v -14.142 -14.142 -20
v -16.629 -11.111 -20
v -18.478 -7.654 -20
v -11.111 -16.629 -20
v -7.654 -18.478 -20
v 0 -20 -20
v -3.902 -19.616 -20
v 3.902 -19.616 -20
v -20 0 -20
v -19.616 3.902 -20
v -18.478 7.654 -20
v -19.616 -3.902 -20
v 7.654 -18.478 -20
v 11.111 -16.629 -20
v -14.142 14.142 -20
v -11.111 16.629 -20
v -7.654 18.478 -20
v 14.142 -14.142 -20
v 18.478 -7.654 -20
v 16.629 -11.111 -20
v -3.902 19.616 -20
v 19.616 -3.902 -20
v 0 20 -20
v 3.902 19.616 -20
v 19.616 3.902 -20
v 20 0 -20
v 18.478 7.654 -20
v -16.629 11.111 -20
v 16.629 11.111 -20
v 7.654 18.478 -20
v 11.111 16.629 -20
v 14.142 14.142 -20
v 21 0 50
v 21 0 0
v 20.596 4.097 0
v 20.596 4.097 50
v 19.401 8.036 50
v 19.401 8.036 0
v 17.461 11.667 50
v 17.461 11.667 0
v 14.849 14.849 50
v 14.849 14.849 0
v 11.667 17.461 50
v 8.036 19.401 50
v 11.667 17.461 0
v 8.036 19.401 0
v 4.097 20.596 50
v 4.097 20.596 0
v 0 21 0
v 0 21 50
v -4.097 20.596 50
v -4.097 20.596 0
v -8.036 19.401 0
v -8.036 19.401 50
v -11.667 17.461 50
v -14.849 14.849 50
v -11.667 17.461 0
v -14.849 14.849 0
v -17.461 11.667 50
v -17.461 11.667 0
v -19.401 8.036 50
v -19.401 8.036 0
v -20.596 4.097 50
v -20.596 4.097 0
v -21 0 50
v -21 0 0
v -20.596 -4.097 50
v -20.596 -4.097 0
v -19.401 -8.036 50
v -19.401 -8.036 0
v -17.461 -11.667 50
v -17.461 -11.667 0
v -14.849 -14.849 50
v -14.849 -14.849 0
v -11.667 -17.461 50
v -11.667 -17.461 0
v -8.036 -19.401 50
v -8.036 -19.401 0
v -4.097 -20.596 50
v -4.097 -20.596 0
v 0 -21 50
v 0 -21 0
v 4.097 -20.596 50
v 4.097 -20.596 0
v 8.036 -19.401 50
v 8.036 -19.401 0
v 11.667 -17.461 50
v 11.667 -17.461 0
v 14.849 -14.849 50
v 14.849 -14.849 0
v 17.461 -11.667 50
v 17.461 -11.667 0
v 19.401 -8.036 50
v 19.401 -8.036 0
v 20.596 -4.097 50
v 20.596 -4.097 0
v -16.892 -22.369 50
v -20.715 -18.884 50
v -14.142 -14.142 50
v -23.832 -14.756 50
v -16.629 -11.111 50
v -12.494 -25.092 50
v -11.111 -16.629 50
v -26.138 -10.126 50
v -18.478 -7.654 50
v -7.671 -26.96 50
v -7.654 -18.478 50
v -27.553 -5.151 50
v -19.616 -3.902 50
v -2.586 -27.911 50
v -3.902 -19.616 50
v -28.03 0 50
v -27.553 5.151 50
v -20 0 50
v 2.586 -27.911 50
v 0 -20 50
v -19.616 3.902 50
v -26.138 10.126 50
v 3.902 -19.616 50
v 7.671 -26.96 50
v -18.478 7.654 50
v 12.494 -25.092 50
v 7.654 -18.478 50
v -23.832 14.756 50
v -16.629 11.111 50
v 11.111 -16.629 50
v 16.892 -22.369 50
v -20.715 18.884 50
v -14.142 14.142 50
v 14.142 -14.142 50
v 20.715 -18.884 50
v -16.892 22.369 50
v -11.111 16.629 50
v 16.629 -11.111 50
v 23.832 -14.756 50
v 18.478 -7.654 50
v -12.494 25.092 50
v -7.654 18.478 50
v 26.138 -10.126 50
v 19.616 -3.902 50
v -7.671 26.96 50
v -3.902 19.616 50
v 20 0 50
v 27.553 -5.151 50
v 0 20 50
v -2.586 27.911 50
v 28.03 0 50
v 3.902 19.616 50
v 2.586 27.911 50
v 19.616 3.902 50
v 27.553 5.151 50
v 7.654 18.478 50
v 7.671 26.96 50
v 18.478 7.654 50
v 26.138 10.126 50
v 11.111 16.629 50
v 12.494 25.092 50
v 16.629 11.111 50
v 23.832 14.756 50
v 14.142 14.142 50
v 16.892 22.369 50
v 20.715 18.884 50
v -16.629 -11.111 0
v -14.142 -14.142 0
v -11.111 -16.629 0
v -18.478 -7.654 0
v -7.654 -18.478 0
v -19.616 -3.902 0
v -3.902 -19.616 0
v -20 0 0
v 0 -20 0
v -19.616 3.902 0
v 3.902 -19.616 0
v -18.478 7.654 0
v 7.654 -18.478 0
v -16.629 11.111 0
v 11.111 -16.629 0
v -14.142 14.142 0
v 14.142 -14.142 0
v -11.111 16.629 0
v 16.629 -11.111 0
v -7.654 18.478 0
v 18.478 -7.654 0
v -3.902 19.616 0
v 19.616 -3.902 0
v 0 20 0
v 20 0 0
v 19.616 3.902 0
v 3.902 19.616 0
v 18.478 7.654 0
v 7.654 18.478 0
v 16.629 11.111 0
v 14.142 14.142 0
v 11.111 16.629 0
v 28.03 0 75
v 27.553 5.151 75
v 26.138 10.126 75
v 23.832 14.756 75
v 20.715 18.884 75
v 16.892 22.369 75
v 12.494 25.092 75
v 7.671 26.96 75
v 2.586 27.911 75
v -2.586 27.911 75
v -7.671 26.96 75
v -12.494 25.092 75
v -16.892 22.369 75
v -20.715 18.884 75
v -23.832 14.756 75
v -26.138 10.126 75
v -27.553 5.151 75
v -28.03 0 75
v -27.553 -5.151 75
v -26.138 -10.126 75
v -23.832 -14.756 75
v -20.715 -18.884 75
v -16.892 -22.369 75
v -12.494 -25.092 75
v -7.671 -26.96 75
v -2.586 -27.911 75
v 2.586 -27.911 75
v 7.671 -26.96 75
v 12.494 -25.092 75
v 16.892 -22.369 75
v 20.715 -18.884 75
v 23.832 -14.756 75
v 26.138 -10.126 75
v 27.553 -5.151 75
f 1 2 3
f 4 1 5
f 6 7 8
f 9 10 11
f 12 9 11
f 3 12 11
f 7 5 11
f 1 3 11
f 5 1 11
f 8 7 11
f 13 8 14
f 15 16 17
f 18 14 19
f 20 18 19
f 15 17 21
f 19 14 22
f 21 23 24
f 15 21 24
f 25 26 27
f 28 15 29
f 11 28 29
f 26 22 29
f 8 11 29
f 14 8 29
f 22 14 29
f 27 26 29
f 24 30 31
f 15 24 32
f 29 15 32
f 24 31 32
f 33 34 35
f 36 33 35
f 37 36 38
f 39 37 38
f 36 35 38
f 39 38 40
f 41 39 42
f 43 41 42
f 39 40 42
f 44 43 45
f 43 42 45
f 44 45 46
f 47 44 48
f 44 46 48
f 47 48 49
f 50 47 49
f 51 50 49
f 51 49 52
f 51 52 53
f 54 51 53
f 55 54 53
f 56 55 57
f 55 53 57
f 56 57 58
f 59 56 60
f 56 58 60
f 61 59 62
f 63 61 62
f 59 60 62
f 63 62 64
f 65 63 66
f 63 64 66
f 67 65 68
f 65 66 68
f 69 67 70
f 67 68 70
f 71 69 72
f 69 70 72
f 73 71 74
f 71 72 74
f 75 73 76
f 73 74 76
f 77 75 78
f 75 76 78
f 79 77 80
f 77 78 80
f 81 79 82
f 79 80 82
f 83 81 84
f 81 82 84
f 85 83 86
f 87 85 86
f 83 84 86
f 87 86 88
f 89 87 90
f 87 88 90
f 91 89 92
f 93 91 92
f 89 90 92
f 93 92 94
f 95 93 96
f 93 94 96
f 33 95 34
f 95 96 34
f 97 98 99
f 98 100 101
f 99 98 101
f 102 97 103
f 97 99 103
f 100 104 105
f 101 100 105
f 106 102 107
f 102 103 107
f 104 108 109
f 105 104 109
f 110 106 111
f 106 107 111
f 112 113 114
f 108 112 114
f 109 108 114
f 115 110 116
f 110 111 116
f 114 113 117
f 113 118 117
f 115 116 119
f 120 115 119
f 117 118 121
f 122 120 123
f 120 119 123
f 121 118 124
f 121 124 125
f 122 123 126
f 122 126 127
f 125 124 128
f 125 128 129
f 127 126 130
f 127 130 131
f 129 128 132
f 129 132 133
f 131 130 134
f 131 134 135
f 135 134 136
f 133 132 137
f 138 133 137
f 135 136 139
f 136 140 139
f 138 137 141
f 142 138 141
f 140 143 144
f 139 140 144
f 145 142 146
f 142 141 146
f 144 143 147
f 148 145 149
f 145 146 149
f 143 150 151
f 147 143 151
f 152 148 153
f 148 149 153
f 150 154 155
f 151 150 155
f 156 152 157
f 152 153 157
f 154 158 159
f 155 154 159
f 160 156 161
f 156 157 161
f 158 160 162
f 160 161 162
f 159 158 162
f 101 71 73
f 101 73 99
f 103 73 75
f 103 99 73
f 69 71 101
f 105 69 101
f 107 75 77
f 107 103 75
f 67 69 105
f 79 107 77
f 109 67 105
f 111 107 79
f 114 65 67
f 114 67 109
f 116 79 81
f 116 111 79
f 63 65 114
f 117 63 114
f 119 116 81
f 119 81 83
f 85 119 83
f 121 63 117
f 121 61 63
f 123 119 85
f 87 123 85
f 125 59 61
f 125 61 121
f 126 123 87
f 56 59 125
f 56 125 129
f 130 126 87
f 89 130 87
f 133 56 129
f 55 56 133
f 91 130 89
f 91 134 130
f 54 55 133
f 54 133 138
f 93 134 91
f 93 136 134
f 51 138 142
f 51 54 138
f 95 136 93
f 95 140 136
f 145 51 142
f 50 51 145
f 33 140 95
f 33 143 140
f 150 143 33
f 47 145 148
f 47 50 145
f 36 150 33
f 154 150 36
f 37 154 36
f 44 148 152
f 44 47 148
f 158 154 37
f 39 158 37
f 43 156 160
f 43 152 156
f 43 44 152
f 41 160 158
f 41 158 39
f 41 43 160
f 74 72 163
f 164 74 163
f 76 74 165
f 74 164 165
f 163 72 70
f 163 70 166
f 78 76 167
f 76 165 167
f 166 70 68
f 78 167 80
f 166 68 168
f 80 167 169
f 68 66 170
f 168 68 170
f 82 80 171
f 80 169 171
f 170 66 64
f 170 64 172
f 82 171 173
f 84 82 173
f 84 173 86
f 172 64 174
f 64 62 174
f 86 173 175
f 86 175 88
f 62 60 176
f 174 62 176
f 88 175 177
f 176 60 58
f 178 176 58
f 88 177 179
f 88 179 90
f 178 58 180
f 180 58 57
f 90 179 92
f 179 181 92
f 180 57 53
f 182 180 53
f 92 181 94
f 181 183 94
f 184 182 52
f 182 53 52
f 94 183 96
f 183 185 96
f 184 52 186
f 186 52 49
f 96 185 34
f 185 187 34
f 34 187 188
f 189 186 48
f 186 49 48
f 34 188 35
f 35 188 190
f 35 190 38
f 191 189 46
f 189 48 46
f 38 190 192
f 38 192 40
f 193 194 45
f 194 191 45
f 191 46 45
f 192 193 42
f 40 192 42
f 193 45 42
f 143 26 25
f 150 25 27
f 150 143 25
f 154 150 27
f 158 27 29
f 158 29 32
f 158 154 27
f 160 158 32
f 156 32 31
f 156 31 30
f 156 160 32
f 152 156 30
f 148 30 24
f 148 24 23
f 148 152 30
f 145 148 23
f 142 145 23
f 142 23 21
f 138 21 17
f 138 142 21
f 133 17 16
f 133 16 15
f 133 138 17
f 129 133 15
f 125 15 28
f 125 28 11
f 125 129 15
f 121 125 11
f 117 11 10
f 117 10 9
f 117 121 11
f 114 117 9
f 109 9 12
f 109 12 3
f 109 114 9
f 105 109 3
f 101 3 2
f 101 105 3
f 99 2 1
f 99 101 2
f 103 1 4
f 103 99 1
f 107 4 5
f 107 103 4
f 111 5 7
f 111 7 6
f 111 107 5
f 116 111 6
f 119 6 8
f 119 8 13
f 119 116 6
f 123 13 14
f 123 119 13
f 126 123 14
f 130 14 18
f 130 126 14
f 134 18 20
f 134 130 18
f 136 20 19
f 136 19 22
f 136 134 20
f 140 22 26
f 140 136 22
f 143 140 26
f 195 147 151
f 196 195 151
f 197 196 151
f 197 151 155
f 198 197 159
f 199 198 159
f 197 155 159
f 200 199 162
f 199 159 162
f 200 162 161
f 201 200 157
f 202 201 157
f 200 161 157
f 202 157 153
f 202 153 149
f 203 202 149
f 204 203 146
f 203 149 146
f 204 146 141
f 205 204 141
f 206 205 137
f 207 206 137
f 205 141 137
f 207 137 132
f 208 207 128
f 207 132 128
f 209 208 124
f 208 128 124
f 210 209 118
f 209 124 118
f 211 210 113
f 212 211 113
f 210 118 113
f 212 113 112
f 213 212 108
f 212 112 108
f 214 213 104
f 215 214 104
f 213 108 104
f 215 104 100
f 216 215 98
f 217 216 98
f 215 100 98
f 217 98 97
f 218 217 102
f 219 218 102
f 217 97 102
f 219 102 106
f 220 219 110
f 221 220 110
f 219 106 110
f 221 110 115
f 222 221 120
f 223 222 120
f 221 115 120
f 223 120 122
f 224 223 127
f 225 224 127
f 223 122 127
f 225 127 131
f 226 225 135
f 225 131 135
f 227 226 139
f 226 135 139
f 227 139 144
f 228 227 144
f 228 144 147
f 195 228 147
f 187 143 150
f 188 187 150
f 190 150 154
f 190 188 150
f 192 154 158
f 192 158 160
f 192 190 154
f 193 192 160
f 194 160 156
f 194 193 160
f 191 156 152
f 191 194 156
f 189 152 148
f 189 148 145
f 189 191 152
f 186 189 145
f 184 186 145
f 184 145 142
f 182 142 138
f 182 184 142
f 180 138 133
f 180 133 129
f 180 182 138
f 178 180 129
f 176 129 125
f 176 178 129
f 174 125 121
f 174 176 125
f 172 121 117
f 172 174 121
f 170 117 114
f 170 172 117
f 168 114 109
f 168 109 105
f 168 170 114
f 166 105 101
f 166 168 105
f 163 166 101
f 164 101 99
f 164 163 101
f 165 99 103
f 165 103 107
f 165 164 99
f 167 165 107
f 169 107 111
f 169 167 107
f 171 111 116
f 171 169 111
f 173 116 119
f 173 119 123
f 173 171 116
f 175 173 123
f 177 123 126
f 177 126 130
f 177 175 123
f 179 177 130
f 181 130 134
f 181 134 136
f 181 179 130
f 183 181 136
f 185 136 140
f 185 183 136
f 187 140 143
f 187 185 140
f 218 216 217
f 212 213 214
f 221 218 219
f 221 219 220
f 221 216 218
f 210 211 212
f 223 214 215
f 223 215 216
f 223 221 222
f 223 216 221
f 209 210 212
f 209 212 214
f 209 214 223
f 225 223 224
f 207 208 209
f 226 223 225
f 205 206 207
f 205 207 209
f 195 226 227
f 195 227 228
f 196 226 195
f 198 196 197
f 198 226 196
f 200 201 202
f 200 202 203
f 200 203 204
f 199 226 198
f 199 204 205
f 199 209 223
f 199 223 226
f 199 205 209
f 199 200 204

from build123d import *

# Parameters (mm, degrees)
F0_R     = 21
F0_R_2   = 20
F1_DEPTH = 50
F2_R     = 20
F3_DEPTH = 70
F2_R_2   = 28.0303533548
F2_R_3   = 21
F4_DEPTH = 25


with BuildPart() as f1:
    # F0 (on Top) → F1 (new body)
    with BuildSketch(Plane.XY):
        Circle(F0_R)
        Circle(F0_R_2, mode=Mode.SUBTRACT)
    extrude(amount=F1_DEPTH)


with BuildPart() as f3:
    # F2 (on face) → F3 (new body)
    with BuildSketch(Plane.XY.offset(50)):
        Circle(F2_R)
    extrude(amount=-F3_DEPTH)

    # F2 (on face) → F4 (join)
    with BuildSketch(Plane.XY.offset(50)):
        Circle(F2_R_2)
        Circle(F2_R_3, mode=Mode.SUBTRACT)
        Circle(F2_R_3)
        Circle(F2_R, mode=Mode.SUBTRACT)
        Circle(F2_R)
    extrude(amount=F4_DEPTH)


solid = Compound([f1.part, f3.part])
